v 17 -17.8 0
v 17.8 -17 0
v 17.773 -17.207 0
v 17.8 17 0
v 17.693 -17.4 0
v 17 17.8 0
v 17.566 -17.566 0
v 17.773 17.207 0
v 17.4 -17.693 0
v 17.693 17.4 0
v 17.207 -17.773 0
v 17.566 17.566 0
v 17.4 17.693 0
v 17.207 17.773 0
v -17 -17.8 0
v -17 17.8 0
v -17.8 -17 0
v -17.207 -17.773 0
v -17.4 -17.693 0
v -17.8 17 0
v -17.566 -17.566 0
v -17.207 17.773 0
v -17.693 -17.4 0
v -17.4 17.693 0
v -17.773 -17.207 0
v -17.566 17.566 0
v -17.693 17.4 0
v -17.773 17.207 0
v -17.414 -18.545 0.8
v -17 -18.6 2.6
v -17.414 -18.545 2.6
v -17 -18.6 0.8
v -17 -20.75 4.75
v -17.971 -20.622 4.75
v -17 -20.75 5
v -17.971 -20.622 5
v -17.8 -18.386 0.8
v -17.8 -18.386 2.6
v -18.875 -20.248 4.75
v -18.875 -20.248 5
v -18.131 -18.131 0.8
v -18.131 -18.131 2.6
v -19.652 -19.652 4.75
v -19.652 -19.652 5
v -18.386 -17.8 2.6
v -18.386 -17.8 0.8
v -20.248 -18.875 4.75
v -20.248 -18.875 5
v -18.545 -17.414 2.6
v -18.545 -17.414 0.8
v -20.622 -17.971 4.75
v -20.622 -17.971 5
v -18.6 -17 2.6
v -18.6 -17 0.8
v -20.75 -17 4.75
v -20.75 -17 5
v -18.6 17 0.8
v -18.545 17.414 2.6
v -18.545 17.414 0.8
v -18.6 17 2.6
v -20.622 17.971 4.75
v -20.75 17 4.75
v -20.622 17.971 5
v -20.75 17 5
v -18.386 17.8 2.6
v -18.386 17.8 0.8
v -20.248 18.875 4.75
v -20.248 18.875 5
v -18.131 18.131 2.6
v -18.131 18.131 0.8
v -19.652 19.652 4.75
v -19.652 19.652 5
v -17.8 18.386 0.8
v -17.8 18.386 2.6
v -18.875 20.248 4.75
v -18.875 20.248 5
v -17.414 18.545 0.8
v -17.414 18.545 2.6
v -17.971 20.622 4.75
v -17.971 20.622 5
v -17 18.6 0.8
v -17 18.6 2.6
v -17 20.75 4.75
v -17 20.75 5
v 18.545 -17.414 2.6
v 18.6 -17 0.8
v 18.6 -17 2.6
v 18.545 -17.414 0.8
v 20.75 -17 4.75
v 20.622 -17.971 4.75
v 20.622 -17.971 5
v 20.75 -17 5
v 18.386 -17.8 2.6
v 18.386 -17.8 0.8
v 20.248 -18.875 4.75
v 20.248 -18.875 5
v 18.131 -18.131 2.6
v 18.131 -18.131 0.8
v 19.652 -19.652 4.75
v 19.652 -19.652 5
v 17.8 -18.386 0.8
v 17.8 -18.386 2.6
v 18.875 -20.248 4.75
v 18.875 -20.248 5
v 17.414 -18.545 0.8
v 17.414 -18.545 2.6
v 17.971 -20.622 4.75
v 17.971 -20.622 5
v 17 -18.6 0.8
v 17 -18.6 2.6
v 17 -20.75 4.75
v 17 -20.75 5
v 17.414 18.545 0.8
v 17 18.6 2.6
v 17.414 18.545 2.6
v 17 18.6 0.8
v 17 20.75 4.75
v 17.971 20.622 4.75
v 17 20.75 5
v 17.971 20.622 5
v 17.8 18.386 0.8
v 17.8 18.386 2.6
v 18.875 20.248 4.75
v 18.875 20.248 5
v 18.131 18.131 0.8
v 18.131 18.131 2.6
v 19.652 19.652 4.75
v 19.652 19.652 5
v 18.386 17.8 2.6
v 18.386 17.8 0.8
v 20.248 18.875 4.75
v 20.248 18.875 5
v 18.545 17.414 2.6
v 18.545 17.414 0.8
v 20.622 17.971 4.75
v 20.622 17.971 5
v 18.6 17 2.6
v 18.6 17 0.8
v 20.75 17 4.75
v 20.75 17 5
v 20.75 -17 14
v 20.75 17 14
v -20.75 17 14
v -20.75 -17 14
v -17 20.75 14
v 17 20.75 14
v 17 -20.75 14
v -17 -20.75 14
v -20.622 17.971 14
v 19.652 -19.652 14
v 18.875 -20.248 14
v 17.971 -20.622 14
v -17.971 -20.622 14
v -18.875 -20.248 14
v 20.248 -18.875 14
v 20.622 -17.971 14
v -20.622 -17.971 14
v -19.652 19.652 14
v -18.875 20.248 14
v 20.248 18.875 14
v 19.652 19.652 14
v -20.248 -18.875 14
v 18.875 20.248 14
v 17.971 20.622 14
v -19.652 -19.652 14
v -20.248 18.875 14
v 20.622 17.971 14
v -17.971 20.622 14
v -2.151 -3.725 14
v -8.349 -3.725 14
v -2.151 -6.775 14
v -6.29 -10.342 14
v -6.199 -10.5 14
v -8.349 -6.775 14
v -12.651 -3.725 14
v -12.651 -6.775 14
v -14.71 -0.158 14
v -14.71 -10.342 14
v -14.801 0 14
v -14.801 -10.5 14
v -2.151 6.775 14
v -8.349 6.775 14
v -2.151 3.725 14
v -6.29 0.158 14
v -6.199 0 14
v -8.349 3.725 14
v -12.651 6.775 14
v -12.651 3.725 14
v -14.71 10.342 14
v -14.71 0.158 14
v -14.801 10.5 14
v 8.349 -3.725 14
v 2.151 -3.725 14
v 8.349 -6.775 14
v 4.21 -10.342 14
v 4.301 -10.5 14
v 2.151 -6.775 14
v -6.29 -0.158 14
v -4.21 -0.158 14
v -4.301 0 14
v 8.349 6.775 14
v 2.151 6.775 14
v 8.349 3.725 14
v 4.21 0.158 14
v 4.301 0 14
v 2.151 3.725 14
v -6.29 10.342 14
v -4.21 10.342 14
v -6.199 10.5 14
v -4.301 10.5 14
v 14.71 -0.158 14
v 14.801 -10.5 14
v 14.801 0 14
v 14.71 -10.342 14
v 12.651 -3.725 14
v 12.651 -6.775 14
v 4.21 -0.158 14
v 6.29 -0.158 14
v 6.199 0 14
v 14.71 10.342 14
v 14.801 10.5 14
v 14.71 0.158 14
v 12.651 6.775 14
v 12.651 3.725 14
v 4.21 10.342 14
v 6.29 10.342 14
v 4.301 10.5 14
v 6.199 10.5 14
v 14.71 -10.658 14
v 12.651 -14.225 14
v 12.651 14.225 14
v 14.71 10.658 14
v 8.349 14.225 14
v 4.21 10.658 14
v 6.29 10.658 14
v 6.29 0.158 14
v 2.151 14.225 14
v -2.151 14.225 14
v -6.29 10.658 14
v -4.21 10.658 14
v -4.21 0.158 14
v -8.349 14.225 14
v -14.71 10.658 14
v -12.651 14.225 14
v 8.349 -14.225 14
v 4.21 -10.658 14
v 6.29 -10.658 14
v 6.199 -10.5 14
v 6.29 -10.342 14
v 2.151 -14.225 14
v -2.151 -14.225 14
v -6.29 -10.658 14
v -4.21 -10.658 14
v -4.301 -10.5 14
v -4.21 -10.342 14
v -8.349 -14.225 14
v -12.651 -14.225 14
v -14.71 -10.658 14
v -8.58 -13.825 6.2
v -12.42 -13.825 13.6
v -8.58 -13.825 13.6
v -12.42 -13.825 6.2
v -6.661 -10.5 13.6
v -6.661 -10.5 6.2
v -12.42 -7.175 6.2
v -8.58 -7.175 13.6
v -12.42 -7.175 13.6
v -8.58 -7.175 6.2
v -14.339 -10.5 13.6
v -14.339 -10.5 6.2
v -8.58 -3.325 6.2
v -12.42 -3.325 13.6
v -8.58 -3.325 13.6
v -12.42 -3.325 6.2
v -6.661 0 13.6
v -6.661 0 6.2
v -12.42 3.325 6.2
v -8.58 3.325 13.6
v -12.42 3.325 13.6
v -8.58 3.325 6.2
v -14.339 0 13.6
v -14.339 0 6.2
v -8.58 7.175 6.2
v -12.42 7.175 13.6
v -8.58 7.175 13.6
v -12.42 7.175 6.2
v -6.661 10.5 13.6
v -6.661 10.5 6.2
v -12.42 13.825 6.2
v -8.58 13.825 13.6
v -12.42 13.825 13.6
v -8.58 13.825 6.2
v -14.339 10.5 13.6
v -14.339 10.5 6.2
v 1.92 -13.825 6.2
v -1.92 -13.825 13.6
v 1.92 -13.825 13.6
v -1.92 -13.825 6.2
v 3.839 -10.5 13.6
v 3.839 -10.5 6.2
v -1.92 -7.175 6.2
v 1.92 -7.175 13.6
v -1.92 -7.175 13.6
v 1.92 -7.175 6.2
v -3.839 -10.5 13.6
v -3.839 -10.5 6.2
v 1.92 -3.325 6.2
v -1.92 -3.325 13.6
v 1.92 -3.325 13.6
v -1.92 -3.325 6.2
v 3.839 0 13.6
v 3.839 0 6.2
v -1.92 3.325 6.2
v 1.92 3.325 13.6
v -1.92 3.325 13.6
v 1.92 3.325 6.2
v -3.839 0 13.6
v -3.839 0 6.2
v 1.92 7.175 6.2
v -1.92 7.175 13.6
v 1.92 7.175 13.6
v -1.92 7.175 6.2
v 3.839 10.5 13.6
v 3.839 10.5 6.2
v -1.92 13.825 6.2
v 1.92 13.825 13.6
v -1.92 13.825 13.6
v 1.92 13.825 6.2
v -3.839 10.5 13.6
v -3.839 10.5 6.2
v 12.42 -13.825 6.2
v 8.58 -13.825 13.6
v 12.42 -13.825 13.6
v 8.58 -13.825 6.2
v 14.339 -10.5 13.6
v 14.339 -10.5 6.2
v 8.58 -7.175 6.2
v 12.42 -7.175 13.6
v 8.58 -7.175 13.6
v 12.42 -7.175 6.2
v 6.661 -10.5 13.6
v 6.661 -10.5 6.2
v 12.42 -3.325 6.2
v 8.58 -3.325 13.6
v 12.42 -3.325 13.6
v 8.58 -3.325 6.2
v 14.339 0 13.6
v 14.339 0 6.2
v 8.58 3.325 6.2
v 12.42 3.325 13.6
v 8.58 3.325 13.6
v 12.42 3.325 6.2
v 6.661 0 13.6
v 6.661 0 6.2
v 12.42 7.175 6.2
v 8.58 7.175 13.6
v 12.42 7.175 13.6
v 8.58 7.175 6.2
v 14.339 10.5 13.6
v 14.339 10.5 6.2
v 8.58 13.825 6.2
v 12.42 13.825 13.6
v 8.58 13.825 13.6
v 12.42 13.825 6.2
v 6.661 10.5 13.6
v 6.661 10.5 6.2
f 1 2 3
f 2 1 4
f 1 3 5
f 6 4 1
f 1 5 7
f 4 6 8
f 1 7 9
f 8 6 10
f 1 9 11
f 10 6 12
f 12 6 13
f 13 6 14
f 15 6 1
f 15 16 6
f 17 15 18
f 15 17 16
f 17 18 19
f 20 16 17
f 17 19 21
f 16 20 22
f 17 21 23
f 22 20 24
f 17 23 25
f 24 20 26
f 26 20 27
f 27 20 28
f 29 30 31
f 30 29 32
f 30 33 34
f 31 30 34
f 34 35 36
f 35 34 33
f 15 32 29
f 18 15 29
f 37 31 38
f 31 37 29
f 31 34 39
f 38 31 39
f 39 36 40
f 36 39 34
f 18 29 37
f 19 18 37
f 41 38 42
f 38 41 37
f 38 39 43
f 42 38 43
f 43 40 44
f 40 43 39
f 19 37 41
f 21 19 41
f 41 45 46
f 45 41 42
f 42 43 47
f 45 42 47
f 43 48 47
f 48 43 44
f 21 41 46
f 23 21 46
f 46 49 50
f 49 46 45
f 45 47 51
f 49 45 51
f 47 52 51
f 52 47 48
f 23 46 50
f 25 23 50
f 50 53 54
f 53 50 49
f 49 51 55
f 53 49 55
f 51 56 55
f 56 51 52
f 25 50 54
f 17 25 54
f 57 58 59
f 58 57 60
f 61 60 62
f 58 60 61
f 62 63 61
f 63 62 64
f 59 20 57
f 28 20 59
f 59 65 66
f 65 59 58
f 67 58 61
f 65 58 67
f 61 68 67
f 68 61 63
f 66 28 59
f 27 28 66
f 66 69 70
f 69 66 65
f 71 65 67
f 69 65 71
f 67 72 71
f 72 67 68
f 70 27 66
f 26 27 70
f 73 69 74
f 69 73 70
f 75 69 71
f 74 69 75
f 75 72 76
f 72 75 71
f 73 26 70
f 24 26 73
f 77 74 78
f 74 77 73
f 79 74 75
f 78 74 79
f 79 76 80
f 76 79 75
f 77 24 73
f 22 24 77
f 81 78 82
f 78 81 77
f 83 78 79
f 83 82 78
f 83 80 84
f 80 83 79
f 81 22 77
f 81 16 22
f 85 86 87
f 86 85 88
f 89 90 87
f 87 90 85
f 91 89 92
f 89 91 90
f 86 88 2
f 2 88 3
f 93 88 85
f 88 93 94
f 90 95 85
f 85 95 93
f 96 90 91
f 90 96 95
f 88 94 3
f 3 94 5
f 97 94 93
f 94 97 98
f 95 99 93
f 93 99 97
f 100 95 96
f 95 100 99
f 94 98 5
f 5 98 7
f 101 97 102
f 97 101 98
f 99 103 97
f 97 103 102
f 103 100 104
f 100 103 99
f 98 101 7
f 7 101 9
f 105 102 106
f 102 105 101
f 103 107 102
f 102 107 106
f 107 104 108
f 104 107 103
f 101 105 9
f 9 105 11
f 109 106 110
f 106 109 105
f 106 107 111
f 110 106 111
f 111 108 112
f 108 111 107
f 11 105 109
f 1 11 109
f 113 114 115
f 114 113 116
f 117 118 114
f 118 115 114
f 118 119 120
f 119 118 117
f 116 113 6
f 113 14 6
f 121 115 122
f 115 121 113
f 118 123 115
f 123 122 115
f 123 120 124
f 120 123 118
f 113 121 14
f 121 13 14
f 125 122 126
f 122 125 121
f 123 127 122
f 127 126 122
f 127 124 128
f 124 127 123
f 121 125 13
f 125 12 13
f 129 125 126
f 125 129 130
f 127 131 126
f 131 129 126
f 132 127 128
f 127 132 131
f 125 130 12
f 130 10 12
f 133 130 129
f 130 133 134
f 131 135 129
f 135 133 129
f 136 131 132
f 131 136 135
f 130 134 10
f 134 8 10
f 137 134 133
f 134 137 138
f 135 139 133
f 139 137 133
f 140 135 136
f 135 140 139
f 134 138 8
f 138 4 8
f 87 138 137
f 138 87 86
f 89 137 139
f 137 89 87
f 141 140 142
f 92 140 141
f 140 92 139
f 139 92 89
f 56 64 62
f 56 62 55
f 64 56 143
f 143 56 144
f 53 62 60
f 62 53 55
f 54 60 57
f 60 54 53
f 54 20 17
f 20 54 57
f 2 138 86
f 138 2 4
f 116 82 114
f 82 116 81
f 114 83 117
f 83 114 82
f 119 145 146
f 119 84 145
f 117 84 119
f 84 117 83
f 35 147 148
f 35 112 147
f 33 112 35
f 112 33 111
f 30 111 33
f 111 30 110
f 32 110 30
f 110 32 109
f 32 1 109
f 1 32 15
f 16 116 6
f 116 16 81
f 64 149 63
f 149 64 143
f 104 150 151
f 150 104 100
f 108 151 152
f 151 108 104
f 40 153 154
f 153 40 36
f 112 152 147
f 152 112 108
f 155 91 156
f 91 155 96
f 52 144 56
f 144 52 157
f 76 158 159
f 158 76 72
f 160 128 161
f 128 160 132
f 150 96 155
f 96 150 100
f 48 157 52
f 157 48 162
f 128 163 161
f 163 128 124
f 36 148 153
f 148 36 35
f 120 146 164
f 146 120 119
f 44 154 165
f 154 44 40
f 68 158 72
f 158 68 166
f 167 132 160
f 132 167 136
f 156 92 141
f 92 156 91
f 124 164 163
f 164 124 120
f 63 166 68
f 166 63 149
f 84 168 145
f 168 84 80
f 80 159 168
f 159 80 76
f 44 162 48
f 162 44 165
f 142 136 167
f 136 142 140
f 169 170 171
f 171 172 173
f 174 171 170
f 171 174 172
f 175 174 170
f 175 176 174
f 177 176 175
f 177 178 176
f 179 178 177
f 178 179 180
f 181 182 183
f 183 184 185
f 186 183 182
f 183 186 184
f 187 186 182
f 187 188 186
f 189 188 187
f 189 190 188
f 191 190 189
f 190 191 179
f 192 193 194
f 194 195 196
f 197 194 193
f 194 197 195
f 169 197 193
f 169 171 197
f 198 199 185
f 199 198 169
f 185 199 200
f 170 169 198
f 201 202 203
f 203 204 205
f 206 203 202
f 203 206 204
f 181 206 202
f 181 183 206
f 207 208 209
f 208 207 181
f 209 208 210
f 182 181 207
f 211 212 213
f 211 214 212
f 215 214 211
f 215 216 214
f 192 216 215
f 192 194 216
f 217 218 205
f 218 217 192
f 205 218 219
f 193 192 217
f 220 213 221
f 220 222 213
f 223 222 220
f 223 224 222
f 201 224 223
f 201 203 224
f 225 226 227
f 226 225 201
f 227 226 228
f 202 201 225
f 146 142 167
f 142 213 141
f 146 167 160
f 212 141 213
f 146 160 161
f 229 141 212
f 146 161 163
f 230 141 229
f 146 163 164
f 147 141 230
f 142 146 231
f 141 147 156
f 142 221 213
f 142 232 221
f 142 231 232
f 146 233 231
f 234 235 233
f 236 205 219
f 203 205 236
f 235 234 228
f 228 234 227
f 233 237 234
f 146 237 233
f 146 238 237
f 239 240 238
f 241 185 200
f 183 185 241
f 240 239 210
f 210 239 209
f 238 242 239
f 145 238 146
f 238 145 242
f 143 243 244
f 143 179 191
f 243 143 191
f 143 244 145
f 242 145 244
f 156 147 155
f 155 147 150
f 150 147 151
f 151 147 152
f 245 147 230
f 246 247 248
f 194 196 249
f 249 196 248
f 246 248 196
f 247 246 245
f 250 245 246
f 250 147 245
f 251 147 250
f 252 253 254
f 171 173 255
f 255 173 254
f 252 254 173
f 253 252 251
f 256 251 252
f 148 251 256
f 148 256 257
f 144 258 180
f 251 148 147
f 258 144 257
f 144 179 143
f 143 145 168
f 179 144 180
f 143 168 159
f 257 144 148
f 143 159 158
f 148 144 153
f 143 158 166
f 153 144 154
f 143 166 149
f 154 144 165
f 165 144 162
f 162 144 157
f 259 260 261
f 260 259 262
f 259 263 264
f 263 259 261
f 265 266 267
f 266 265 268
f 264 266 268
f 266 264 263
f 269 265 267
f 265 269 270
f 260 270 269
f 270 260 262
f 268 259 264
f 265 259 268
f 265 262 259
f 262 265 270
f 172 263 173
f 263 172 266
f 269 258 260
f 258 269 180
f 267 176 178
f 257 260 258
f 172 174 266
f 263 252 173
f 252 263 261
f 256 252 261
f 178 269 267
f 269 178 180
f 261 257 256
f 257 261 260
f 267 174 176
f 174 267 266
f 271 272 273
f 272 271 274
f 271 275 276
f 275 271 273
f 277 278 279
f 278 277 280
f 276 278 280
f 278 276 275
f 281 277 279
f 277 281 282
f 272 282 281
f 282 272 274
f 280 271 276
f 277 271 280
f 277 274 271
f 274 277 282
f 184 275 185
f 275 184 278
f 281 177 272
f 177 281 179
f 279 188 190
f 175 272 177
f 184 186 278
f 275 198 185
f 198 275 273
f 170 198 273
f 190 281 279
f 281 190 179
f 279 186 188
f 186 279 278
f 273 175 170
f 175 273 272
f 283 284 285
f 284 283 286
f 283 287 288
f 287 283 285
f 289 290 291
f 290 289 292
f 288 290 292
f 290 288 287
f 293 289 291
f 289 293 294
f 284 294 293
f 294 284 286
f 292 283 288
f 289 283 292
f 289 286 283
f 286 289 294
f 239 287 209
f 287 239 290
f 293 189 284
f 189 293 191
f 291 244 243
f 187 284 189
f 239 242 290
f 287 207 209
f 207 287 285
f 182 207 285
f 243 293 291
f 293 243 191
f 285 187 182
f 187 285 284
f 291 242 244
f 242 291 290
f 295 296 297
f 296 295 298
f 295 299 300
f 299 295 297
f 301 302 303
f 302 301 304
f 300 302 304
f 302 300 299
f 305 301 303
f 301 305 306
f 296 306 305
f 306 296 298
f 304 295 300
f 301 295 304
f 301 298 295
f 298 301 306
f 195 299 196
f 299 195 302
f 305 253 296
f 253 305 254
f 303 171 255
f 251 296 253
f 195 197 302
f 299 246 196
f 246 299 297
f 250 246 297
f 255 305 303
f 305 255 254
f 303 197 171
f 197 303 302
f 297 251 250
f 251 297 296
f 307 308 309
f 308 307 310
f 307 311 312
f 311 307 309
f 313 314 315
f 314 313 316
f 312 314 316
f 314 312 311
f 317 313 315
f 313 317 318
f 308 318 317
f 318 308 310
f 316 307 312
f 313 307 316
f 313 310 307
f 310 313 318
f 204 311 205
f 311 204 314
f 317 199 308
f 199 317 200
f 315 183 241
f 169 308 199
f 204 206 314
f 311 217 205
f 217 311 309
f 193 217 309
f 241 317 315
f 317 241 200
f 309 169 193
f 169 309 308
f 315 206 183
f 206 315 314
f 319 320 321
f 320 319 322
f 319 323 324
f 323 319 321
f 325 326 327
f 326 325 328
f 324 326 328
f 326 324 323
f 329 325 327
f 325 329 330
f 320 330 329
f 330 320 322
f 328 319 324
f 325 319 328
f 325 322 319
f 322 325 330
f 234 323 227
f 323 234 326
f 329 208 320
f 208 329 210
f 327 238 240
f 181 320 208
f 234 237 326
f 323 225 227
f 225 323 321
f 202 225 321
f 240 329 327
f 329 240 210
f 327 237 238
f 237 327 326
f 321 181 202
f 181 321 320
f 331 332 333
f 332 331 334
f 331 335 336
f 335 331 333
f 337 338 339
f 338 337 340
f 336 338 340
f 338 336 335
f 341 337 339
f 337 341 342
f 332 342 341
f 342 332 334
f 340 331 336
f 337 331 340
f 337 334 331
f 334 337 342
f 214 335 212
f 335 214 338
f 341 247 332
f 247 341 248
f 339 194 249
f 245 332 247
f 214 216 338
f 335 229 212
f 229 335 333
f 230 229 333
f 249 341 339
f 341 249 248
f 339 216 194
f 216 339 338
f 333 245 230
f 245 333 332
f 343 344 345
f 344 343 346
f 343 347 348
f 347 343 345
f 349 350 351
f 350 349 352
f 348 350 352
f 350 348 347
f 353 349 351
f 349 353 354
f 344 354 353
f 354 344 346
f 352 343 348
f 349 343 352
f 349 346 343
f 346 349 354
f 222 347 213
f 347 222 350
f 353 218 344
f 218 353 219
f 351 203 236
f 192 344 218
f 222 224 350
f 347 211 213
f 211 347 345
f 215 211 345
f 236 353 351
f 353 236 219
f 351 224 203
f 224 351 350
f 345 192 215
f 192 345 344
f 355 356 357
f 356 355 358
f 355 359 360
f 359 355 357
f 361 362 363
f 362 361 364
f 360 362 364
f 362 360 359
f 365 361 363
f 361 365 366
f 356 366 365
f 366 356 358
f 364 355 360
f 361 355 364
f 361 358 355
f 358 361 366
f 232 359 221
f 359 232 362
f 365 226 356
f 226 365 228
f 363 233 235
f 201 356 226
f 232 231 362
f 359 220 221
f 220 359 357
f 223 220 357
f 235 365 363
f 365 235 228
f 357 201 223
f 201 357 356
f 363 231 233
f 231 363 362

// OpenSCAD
// Gridfinity quarter-inch hex-bit holder; print feet down, sockets facing up.
// Blind hex sockets hold 6.35 mm shanks; 25 mm bits protrude 17.2 mm by default.
// Print with normal infill. This solid insert has no upper stacking lip.
// Counts and insertion depth are capped to preserve printable webs and floors.
grid_x = 1; // Width in 42 mm grid units [1:1:3]
grid_y = 1; // Depth in 42 mm grid units [1:1:3]
height_units = 2; // Overall height including feet, in 7 mm units [2:1:5]
bit_columns = 3; // Requested sockets across width; capped to leave 1.2 mm webs [1:1:9]
bit_rows = 3; // Requested sockets across depth; capped to leave 1.2 mm webs [1:1:9]
bit_flats = 6.35; // Bit shank size measured across opposite flats, mm [4:0.05:8]
bit_clearance = 0.3; // Added to the socket across-flats size, mm [0.2:0.05:0.4]
socket_depth = 7.8; // Bit insertion depth, mm; limited to preserve the base [4:0.2:20]
magnet_holes = false; // Add four underside pockets per cell for 6 x 2 mm magnets
screw_holes = false; // Add coaxial blind 3 mm M3 holes, 5 mm deep
magnet_clearance = 0.4; // Added to 6 mm magnet diameter for glue fit, mm [0.2:0.1:0.4]
magnet_depth = 2.2; // Pocket depth for 2 mm thick magnets, mm [2:0.1:2.4]

// Original dimensional references (implementation written for this example):
// https://gridfinity.xyz/specification/
// https://kennetek.github.io/gridfinity-rebuilt-openscad/constants/
// https://github.com/kennetek/gridfinity-rebuilt-openscad/blob/main/src/core/standard.scad
// Each cell has the standard 0.8/1.8/2.15 mm stepped foot and 26 mm
// fastener spacing. Hole centres are distributed evenly inside a 5 mm margin.
/* [Hidden] */
eps = 0.02;
width = grid_x*42-0.5;
depth = grid_y*42-0.5;
body_h = height_units*7;
hole_d = (bit_flats+bit_clearance)/cos(30);
entry_d = (bit_flats+bit_clearance+0.8)/cos(30);
actual_columns = min(bit_columns,max(1,floor((width-10)/(entry_d+1.2))));
actual_rows = min(bit_rows,max(1,floor((depth-10)/(entry_d+1.2))));
step_x = (width-10)/actual_columns;
step_y = (depth-10)/actual_rows;
// Retain 1.2 mm above the joining slab and optional blind screw holes.
actual_depth = min(socket_depth,body_h-6.2);
assert(grid_x>=1 && grid_y>=1 && grid_x==floor(grid_x) && grid_y==floor(grid_y),
    "Grid counts must be positive integers");
assert(height_units>=2 && height_units==floor(height_units),"Use at least two height units");
assert(bit_columns>=1 && bit_rows>=1 && bit_columns==floor(bit_columns)
    && bit_rows==floor(bit_rows),"Socket counts must be positive integers");
assert(min(step_x,step_y)>=entry_d+1.2,"Use fewer sockets or a larger grid: leave 1.2 mm webs");
assert(socket_depth>=4,"Socket depth must be at least 4 mm");
if (actual_columns<bit_columns || actual_rows<bit_rows || actual_depth<socket_depth)
    echo("Effective sockets (columns, rows, depth mm):",
        actual_columns,actual_rows,actual_depth);

module gridfinity_hex_bit_holder() {
    difference() {
        union() {
            feet();
            translate([0,0,5]) linear_extrude(height=body_h-5)
                rounded_outline(width,depth,3.75);
        }
        for (ix=[0:actual_columns-1], iy=[0:actual_rows-1])
            translate([(ix-(actual_columns-1)/2)*step_x,
                       (iy-(actual_rows-1)/2)*step_y,body_h-actual_depth]) {
                cylinder(h=actual_depth+eps,d=hole_d,$fn=6);
                // A 0.4 mm 45-degree lead-in eases insertion at each flat.
                translate([0,0,actual_depth-0.4])
                    cylinder(h=0.4+eps,d1=hole_d,
                        d2=entry_d+2*eps/cos(30),$fn=6);
            }
        fastener_holes();
    }
}

// Fill a rounded rectangle from radius/height stations. Corner centres stay
// fixed: changing radius by the same amount as Z makes a true 45-degree slope.
// Two extruded sections and four turned corners avoid hulls and external libs.
module rounded_profile(cx, cy, stations) {
    union() {
        rotate([90,0,0]) linear_extrude(height=2*cy, center=true)
            polygon(concat(
                [for (p=stations) [cx+p[0],p[1]]],
                [for (i=[len(stations)-1:-1:0])
                    [-cx-stations[i][0],stations[i][1]]]));
        rotate([90,0,90]) linear_extrude(height=2*cx, center=true)
            polygon(concat(
                [for (p=stations) [cy+p[0],p[1]]],
                [for (i=[len(stations)-1:-1:0])
                    [-cy-stations[i][0],stations[i][1]]]));
        for (x=[-cx,cx], y=[-cy,cy]) translate([x,y,0])
            rotate_extrude($fn=24)
                polygon(concat([[0,stations[0][1]]], stations,
                    [[0,stations[len(stations)-1][1]]]));
    }
}

// Six chords per quarter-circle: small files, with real rounded corners.
module rounded_outline(w, d, r) {
    polygon([for (q=[0:3], j=[0:6])
        let(a=q*90+j*15,
            x=(q==0 || q==3) ? w/2-r : -w/2+r,
            y=q<2 ? d/2-r : -d/2+r)
        [x+r*cos(a),y+r*sin(a)]]);
}

// A 0.25 mm vertical collar keeps the joining slab above the 5 mm socket
// ridges. The standard 4.75 mm stepped mating profile stays unchanged.
module feet() {
    for (ix=[0:grid_x-1], iy=[0:grid_y-1])
        translate([(ix-(grid_x-1)/2)*42,(iy-(grid_y-1)/2)*42,0])
            rounded_profile(17,17,
                [[0.8,0],[1.6,0.8],[1.6,2.6],[3.75,4.75],[3.75,5]]);
}

// Four positions per cell, +/-13 mm: 26 mm centre spacing in both axes.
module fastener_holes() {
    for (ix=[0:grid_x-1], iy=[0:grid_y-1], sx=[-1,1], sy=[-1,1])
        translate([(ix-(grid_x-1)/2)*42+sx*13,
                   (iy-(grid_y-1)/2)*42+sy*13,-eps]) {
            if (magnet_holes)
                cylinder(h=magnet_depth+eps,d=6+magnet_clearance,$fn=24);
            if (screw_holes)
                cylinder(h=5+eps,d=3,$fn=20);
        }
}

color("#e4665f") gridfinity_hex_bit_holder();
